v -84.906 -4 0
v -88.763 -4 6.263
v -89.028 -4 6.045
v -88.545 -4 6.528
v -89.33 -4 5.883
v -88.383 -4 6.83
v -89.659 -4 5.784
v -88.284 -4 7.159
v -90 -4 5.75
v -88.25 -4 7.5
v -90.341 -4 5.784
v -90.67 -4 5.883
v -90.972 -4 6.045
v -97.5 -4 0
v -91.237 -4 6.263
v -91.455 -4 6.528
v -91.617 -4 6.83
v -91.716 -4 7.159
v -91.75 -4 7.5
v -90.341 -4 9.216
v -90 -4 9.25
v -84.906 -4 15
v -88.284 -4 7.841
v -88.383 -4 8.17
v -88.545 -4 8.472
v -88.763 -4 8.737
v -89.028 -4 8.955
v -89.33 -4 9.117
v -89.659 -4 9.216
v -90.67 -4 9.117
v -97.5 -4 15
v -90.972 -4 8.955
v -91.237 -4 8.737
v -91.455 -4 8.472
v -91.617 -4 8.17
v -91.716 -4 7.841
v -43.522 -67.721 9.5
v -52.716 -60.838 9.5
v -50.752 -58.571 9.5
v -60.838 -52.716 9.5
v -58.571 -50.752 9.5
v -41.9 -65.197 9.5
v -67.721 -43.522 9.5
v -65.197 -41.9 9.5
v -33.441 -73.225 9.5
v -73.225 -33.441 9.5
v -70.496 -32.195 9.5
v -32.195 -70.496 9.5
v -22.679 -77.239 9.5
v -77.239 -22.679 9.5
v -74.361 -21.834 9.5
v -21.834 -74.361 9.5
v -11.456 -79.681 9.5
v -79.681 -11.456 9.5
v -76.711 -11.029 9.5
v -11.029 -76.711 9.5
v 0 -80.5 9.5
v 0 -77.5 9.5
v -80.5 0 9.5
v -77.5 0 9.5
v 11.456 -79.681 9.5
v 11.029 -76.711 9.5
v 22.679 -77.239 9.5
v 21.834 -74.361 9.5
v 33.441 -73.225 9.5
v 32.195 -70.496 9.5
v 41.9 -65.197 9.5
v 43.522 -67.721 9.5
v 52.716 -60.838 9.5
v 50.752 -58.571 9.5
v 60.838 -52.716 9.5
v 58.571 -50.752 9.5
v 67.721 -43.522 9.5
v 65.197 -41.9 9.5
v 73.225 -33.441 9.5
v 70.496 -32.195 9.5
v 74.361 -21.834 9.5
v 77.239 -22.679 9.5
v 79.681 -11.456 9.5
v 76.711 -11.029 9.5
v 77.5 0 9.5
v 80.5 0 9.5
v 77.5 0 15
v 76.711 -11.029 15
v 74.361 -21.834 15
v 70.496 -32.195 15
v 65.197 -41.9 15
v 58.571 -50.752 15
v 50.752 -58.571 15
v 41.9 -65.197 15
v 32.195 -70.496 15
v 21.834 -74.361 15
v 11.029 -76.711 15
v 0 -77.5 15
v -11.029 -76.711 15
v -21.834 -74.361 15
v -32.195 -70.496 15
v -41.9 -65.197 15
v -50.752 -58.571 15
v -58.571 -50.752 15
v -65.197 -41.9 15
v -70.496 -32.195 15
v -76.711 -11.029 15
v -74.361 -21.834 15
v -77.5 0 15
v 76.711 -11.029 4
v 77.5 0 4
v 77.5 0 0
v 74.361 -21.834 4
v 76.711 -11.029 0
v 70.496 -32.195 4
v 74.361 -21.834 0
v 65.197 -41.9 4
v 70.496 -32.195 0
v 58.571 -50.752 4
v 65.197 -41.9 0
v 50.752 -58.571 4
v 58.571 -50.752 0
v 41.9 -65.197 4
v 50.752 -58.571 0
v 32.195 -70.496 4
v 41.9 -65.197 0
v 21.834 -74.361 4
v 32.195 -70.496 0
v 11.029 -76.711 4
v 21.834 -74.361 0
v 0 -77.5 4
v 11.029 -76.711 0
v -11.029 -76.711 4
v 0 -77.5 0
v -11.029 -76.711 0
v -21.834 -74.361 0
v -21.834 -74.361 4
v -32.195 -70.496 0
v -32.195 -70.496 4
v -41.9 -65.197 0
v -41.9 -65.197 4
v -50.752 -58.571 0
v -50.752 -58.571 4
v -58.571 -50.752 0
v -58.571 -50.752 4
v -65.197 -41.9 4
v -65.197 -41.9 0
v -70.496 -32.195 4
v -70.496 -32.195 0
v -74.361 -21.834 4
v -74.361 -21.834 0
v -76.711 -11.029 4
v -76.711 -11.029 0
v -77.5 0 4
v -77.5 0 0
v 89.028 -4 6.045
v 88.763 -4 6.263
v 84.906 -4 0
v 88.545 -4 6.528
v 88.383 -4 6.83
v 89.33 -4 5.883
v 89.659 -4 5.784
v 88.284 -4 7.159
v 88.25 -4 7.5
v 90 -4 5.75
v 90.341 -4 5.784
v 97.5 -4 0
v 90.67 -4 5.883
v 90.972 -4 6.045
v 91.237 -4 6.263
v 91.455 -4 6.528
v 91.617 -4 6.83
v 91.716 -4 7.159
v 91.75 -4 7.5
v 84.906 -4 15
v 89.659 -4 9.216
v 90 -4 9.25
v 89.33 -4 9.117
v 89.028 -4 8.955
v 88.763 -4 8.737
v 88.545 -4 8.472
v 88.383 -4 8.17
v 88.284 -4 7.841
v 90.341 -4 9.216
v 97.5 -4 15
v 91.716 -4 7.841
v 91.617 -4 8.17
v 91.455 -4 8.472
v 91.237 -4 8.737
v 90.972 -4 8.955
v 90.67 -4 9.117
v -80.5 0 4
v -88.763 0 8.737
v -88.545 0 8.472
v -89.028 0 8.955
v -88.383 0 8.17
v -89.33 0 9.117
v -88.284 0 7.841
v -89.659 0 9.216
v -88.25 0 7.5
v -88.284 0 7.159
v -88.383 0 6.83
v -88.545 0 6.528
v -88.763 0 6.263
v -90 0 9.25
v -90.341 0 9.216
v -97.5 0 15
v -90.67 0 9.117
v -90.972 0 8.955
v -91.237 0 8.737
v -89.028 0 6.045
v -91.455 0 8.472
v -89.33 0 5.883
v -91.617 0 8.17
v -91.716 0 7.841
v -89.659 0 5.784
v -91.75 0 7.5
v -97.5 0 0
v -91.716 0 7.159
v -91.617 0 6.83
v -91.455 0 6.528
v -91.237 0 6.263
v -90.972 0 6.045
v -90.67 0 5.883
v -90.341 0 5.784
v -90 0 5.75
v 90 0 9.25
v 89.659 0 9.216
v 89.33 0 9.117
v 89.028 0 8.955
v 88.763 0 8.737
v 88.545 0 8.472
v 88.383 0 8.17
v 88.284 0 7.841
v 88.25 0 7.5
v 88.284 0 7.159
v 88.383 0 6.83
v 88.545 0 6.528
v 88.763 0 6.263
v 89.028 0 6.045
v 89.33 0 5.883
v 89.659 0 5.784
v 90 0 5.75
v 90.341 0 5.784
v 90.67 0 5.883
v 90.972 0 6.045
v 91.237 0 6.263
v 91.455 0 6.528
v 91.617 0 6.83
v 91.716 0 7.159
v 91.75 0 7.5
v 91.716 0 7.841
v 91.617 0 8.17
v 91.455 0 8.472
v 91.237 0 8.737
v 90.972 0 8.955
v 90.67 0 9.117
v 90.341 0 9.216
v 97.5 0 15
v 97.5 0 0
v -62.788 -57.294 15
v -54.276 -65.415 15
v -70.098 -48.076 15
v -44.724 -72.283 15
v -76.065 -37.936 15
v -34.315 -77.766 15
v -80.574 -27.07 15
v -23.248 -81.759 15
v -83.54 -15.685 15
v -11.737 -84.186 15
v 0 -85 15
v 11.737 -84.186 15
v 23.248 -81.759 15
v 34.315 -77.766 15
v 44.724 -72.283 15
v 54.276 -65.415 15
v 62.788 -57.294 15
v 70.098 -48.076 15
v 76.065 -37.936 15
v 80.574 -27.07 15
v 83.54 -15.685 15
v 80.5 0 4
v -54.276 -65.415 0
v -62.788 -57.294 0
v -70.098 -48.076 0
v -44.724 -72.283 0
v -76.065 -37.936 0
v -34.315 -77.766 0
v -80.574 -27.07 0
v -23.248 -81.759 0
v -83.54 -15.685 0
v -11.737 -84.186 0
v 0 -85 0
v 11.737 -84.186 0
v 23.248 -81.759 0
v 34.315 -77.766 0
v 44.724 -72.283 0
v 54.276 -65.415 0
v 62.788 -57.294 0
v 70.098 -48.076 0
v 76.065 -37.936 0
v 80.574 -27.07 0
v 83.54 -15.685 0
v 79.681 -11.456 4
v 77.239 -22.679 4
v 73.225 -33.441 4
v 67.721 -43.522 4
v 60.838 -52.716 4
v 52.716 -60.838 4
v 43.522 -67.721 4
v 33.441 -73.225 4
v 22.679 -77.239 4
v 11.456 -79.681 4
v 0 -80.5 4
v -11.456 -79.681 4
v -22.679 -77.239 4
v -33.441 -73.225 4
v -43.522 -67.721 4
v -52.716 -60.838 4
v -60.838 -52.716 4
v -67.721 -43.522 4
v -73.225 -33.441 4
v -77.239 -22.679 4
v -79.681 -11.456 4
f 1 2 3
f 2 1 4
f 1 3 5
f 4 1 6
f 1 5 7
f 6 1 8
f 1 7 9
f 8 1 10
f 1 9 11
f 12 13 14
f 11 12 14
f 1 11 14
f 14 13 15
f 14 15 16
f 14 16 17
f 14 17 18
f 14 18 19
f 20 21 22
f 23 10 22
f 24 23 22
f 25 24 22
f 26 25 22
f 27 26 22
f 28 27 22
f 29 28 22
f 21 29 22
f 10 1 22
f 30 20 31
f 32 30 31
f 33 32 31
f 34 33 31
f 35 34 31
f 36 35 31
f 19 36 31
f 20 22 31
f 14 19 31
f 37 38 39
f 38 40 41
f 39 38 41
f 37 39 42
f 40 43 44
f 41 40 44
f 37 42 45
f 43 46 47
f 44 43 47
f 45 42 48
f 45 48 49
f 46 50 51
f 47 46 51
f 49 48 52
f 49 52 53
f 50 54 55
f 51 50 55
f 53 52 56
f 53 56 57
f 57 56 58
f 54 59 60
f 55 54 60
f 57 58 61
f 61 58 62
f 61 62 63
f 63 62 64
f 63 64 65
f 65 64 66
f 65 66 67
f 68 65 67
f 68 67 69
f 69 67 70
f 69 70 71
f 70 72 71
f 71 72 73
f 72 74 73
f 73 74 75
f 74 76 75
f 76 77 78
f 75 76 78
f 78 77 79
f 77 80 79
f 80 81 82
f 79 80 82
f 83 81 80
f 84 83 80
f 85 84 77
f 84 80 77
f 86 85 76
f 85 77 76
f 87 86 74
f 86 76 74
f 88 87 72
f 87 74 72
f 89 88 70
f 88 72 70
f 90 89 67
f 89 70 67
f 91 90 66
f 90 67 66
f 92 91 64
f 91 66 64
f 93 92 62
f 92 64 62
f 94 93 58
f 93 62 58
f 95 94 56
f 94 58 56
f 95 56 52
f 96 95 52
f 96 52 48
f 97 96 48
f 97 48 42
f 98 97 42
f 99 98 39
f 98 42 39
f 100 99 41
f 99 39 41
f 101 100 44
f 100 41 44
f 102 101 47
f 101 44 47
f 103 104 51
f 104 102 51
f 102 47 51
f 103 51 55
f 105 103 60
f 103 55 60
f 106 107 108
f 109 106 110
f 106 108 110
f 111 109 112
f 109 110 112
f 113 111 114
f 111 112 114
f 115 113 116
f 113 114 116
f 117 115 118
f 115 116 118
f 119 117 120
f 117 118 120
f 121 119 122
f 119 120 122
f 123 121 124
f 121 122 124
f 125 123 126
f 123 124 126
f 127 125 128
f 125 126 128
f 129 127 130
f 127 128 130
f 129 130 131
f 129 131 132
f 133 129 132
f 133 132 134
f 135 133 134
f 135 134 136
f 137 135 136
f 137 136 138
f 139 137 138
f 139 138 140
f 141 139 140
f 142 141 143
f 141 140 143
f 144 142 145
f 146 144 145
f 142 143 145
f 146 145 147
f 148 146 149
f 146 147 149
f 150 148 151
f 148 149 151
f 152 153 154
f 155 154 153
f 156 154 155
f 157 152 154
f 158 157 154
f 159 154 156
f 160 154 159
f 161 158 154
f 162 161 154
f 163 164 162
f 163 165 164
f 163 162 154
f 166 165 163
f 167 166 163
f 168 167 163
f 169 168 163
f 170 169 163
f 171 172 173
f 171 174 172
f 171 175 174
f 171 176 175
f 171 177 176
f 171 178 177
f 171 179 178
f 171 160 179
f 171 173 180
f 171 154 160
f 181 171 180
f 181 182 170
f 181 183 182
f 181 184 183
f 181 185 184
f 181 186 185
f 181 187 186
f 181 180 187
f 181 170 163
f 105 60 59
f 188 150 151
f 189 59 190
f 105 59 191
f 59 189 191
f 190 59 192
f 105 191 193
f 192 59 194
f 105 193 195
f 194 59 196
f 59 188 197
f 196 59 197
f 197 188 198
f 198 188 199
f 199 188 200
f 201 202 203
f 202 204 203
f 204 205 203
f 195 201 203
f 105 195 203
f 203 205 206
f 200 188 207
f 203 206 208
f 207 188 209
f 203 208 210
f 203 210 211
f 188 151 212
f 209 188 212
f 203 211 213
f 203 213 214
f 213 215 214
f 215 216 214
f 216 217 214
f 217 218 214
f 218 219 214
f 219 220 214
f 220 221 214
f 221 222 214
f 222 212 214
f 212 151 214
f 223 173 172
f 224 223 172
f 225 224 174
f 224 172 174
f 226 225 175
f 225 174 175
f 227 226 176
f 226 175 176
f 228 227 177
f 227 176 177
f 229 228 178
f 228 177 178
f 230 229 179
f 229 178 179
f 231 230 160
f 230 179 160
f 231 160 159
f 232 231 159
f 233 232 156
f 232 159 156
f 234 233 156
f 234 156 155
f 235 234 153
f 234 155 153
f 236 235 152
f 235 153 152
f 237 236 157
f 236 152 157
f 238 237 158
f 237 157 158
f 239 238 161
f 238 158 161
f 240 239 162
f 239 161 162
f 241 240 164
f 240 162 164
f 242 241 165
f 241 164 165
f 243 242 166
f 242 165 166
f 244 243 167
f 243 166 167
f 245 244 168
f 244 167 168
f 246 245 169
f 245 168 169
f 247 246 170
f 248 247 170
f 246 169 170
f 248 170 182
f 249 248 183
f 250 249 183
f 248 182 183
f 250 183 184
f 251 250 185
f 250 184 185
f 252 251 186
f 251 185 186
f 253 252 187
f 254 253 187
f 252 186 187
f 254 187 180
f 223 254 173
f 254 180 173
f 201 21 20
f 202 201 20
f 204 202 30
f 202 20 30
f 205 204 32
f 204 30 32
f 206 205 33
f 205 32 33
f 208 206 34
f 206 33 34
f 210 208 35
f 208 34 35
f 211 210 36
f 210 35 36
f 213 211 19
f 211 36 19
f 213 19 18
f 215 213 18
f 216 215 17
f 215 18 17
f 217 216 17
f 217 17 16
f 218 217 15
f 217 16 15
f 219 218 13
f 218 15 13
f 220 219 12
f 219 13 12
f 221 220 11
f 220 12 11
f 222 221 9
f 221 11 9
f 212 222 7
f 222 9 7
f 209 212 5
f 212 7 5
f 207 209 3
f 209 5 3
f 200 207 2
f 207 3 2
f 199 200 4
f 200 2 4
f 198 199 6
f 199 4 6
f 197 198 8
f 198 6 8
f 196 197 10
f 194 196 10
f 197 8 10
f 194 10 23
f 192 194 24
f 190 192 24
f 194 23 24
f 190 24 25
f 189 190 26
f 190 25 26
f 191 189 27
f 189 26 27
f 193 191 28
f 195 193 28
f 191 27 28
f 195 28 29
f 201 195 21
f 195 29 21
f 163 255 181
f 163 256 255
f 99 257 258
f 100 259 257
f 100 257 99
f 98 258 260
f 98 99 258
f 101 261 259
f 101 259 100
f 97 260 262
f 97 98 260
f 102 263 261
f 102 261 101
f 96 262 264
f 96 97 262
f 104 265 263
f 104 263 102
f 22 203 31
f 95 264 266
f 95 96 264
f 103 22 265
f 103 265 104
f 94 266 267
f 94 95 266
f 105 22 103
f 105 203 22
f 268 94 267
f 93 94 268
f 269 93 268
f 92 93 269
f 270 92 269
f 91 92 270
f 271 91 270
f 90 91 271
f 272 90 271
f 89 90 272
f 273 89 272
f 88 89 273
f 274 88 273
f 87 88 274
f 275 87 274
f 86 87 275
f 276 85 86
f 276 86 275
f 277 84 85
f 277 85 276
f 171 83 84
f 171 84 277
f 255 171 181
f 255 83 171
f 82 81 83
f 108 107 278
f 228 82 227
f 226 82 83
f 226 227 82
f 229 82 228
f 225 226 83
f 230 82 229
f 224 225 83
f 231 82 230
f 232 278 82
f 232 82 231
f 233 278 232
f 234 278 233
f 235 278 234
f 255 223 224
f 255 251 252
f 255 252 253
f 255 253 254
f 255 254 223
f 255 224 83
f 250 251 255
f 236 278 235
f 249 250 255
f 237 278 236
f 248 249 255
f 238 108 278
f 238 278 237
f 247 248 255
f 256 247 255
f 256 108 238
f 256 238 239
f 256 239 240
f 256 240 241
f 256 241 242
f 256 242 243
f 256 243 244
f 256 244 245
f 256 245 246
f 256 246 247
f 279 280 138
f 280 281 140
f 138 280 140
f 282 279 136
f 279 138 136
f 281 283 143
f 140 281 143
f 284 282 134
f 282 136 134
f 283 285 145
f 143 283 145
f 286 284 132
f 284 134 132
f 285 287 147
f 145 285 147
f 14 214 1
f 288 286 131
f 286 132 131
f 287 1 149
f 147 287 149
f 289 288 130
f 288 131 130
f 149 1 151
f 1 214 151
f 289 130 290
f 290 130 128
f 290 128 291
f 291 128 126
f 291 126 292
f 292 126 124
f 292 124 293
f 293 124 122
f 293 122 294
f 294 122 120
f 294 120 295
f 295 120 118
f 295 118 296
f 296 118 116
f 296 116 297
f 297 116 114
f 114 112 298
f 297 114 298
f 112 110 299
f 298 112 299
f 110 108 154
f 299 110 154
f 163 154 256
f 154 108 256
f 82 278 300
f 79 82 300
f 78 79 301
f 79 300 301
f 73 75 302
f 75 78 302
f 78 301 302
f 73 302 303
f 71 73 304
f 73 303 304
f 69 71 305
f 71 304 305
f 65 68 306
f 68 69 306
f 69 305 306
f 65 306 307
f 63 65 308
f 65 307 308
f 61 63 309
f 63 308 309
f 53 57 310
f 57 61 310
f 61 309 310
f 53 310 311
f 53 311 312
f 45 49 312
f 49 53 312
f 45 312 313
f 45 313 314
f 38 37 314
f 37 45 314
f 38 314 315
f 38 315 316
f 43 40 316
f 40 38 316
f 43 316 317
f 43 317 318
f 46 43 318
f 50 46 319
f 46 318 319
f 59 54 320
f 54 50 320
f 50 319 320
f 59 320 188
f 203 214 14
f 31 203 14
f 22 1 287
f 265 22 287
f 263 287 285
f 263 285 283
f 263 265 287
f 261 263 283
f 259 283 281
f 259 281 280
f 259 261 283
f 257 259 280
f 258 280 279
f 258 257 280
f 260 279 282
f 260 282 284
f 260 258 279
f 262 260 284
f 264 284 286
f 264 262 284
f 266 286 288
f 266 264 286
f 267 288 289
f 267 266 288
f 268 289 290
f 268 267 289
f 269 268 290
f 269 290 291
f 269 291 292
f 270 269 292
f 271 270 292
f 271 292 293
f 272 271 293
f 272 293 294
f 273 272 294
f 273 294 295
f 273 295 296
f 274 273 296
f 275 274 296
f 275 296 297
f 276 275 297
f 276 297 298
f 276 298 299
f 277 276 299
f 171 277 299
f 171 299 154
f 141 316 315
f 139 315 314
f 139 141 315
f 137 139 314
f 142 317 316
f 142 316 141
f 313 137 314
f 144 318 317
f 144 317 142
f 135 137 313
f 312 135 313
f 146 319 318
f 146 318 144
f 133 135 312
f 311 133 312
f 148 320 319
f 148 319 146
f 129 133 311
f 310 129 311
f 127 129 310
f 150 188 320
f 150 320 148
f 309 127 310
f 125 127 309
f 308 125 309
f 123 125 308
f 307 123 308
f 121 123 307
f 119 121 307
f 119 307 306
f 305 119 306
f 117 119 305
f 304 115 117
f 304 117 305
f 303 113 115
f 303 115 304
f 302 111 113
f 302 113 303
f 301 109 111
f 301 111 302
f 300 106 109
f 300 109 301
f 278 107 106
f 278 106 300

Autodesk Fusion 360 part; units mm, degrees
sketch "Sketch1" plane through (0, 0, 0) normal (0, 0, 1) x (1, 0, 0)
  circle A0 centre (0, 0) radius 87.5
  circle A1 centre (0, 0) radius 77.5
  line L0 (77.5, 0) -> (97.5, 0)
  line L1 (97.5, 0) -> (97.5, -97.5)
  line L2 (97.5, -97.5) -> (77.5, -97.5)
  line L3 (77.5, -97.5) -> (77.5, 0)
  line L4 (-77.5, 0) -> (-97.5, 0)
  line L5 (-97.5, 0) -> (-97.5, -97.5)
  line L6 (-97.5, -97.5) -> (-77.5, -97.5)
  line L7 (-77.5, -97.5) -> (-77.5, 0)
  line L8 (97.5, -97.5) -> (-97.5, -97.5)
  line L9 (-97.5, -97.5) -> (-97.5, -102.5)
  line L10 (-97.5, -102.5) -> (97.5, -102.5)
  line L11 (97.5, -102.5) -> (97.5, -97.5)
  dimension "d1" = 155
  dimension "d2" = 175
  dimension "d15" = 97.5
  dimension "d16" = 5
  dimension "d17" = 10
  dimension "d18" = 20
  dimension "d19" = 20
extrude "Extrude1" add sketch "Sketch1" along normal blind 15 contours A0 L0 L1 L2 L3 L8 | A0 L0 L3 | A0 L4 L7 | A0 L4 L5 L6 L7 L8 | A0 L3 L7 L8 | A0 A1 L3 L7 | L2 L6 L8 L9 L10 L11
sketch "Sketch2" plane through (0, 0, 0) normal (0, 0, 1) x (1, 0, 0)
  circle A0 centre (0, 0) radius 80.5
  dimension "d10" = 161
extrude "Extrude2" cut sketch "Sketch2" along normal blind 5.5 from surface at 4
sketch "Sketch3" plane through (0, 0, 15) normal (0, 0, 1) x (-1, 0, 0)
  line L0 (77.5, 0) -> (97.5, 0)
  line L1 (97.5, 0) -> (97.5, 102.5)
  line L2 (97.5, 102.5) -> (-97.5, 102.5)
  line L3 (-97.5, 102.5) -> (-97.5, 0)
  line L4 (-97.5, 0) -> (-77.5, 0)
  arc A0 (77.5, 0) -> (-77.5, 0) centre (0, 0) ccw
  line L5 (-30, 102.5) -> (30, 102.5)
  line L6 (30, 102.5) -> (30, 97.5)
  line L7 (30, 97.5) -> (-30, 97.5)
  line L8 (-30, 97.5) -> (-30, 102.5)
  dimension "d22" = 30
  dimension "d23" = 30
extrude "Extrude3" add sketch "Sketch3" along normal blind 30 contours L2 L5 L6 L7 L8
fillet "Fillet2" radius 15 4 edges at (-30, -100, 45) (30, -100, 45) (-30, -100, 15) (30, -100, 15)
sketch "Sketch4" plane through (0, -97.5, 0) normal (0, 1, 0) x (-1, 0, 0)
  arc A0 (-15, 45) -> (-30, 30) centre (-15, 30) ccw
  arc A1 (-45, 15) -> (-30, 30) centre (-45, 30) ccw
  line L0 (-45, 15) -> (45, 15)
  arc A2 (30, 30) -> (45, 15) centre (45, 30) ccw
  arc A3 (30, 30) -> (15, 45) centre (15, 30) ccw
  line L1 (15, 45) -> (-15, 45)
  line L2 (-97.5, 7.5) -> (97.5, 7.5) construction
  line L3 (-45, 0) -> (45, 0)
  line L4 (15, -30) -> (-15, -30)
  arc A4 (15, -30) -> (30, -15) centre (15, -15) ccw
  arc A5 (45, 0) -> (30, -15) centre (45, -15) ccw
  arc A6 (-30, -15) -> (-15, -30) centre (-15, -15) ccw
  arc A7 (-30, -15) -> (-45, 0) centre (-45, -15) ccw
  point P0 (0, 30)
  point P1 (-97.5, 7.5)
  point P2 (97.5, 7.5)
  point P3 (0, -15)
  dimension "d28" = 15
sketch "Sketch5" plane through (0, 0, 0) normal (0, 0, -1) x (1, 0, 0)
  line L0 (-97.5, 0) -> (-77.5, 0)
  arc A0 (77.5, 0) -> (-77.5, 0) centre (0, 0) ccw
  line L1 (77.5, 0) -> (97.5, 0)
  line L2 (97.5, 0) -> (97.5, 102.5)
  line L3 (97.5, 102.5) -> (-97.5, 102.5)
  line L4 (-97.5, 102.5) -> (-97.5, 0)
  line L5 (80, 102.5) -> (-80, 102.5)
  line L6 (-80, 102.5) -> (-80, 97.5)
  line L7 (-80, 97.5) -> (80, 97.5)
  line L8 (80, 97.5) -> (80, 102.5)
  dimension "d39" = 80
  dimension "d40" = 80
extrude "Extrude4" add sketch "Sketch5" along normal blind 30 contours L3 L5 L6 L7 L8
fillet "Fillet4" radius 15 4 edges at (80, -100, -30) (-80, -100, -30) (-80, -100, 0) (80, -100, 0)
sketch "Sketch6" plane through (0, -97.5, 0) normal (0, 1, 0) x (-1, 0, 0)
  arc A0 (65, -30) -> (80, -15) centre (65, -15) ccw
  arc A1 (95, 0) -> (80, -15) centre (95, -15) ccw
  line L0 (95, 0) -> (-95, 0)
  arc A2 (-80, -15) -> (-95, 0) centre (-95, -15) ccw
  arc A3 (-80, -15) -> (-65, -30) centre (-65, -15) ccw
  line L1 (-65, -30) -> (65, -30)
  line L2 (-77.5, 15) -> (77.5, 15)
  point P0 (0, -15)
  point P1 (0, 30)
  point P2 (50, -15)
  point P3 (-50, -15)
  dimension "d49" = 15
  dimension "d50" = 15
  dimension "d53" = 50
  dimension "d54" = 50
hole "Hole2" at (0, -97.5, -15) at (0, -97.5, 30) at (-50, -97.5, -15) at (50, -97.5, -15) direction (0, -1, 0) diameter 4 end through all
sketch "Sketch7" plane through (0, 0, 0) normal (0, 1, 0) x (-1, 0, 0)
  line L0 (77.5, 9.5) -> (80.5, 9.5)
  line L1 (80.5, 9.5) -> (80.5, 4)
  line L2 (80.5, 4) -> (77.5, 4)
  line L3 (77.5, 4) -> (77.5, 0)
  line L4 (77.5, 0) -> (97.5, 0)
  line L5 (97.5, 0) -> (97.5, 15)
  line L6 (97.5, 15) -> (77.5, 15)
  line L7 (77.5, 15) -> (77.5, 9.5)
  line L8 (-77.5, 0) -> (-97.5, 0)
  line L9 (-97.5, 0) -> (-97.5, 15)
  point P0 (90, 7.5)
  point P1 (-90, 7.5)
  dimension "d55" = 7.5
  dimension "d56" = 7.5
  dimension "d57" = 7.5
  dimension "d58" = 7.5
hole "Hole3" at (-90, 0, 7.5) at (90, 0, 7.5) direction (0, -1, 0) diameter 3.5 depth 15 tip angle 180
fillet "Fillet5" radius 10 2 edges at (0, -97.5, 0) (0, -97.5, 15)
sketch "Sketch8" plane through (0, 0, 0) normal (0, 0, -1) x (1, 0, 0)
  line L0 (-95, 87.5) -> (-95, 102.5)
  line L1 (-95, 102.5) -> (-97.5, 102.5)
  line L2 (-97.5, 102.5) -> (-97.5, 0)
  line L3 (-97.5, 0) -> (-77.5, 0)
  arc A0 (77.5, 0) -> (-77.5, 0) centre (0, 0) ccw
  line L4 (77.5, 0) -> (97.5, 0)
  line L5 (97.5, 0) -> (97.5, 102.5)
  line L6 (97.5, 102.5) -> (95, 102.5)
  line L7 (95, 102.5) -> (95, 87.5)
  line L8 (95, 87.5) -> (-95, 87.5)
  circle A1 centre (0, 0) radius 85
  line L9 (97.5, 0) -> (84.9058, 0)
  line L10 (84.9058, 0) -> (84.9058, 4)
  line L11 (84.9058, 4) -> (97.5, 4)
  line L12 (97.5, 4) -> (97.5, 0)
  line L13 (-97.5, 0) -> (-84.9058, 0)
  line L14 (-84.9058, 0) -> (-84.9058, 4)
  line L15 (-84.9058, 4) -> (-97.5, 4)
  line L16 (-97.5, 4) -> (-97.5, 0)
  line L17 (-97.5, 4) -> (97.5, 4)
  line L18 (97.5, 4) -> (97.5, 102.5)
  line L19 (97.5, 102.5) -> (-97.5, 102.5)
  line L20 (-97.5, 102.5) -> (-97.5, 4)
  dimension "d64" = 170
  dimension "d65" = 4
  dimension "d66" = 4
extrude "Extrude5" cut sketch "Sketch8" along normal through all and the other way through all contours L0 L1 L2 L5 L6 L7 L8 A1 L11 L15 L17 L18 L19 L20 | L0 L7 L8 L19
equation "d15 = d2 / 2 + 10 mm"
equation "d18 = d17 + 10 mm"
equation "d19 = d18"
equation "d23 = d22"
equation "d40 = d39"
equation "d56 = d55"
equation "d58 = d57"
equation "d66 = d65"
